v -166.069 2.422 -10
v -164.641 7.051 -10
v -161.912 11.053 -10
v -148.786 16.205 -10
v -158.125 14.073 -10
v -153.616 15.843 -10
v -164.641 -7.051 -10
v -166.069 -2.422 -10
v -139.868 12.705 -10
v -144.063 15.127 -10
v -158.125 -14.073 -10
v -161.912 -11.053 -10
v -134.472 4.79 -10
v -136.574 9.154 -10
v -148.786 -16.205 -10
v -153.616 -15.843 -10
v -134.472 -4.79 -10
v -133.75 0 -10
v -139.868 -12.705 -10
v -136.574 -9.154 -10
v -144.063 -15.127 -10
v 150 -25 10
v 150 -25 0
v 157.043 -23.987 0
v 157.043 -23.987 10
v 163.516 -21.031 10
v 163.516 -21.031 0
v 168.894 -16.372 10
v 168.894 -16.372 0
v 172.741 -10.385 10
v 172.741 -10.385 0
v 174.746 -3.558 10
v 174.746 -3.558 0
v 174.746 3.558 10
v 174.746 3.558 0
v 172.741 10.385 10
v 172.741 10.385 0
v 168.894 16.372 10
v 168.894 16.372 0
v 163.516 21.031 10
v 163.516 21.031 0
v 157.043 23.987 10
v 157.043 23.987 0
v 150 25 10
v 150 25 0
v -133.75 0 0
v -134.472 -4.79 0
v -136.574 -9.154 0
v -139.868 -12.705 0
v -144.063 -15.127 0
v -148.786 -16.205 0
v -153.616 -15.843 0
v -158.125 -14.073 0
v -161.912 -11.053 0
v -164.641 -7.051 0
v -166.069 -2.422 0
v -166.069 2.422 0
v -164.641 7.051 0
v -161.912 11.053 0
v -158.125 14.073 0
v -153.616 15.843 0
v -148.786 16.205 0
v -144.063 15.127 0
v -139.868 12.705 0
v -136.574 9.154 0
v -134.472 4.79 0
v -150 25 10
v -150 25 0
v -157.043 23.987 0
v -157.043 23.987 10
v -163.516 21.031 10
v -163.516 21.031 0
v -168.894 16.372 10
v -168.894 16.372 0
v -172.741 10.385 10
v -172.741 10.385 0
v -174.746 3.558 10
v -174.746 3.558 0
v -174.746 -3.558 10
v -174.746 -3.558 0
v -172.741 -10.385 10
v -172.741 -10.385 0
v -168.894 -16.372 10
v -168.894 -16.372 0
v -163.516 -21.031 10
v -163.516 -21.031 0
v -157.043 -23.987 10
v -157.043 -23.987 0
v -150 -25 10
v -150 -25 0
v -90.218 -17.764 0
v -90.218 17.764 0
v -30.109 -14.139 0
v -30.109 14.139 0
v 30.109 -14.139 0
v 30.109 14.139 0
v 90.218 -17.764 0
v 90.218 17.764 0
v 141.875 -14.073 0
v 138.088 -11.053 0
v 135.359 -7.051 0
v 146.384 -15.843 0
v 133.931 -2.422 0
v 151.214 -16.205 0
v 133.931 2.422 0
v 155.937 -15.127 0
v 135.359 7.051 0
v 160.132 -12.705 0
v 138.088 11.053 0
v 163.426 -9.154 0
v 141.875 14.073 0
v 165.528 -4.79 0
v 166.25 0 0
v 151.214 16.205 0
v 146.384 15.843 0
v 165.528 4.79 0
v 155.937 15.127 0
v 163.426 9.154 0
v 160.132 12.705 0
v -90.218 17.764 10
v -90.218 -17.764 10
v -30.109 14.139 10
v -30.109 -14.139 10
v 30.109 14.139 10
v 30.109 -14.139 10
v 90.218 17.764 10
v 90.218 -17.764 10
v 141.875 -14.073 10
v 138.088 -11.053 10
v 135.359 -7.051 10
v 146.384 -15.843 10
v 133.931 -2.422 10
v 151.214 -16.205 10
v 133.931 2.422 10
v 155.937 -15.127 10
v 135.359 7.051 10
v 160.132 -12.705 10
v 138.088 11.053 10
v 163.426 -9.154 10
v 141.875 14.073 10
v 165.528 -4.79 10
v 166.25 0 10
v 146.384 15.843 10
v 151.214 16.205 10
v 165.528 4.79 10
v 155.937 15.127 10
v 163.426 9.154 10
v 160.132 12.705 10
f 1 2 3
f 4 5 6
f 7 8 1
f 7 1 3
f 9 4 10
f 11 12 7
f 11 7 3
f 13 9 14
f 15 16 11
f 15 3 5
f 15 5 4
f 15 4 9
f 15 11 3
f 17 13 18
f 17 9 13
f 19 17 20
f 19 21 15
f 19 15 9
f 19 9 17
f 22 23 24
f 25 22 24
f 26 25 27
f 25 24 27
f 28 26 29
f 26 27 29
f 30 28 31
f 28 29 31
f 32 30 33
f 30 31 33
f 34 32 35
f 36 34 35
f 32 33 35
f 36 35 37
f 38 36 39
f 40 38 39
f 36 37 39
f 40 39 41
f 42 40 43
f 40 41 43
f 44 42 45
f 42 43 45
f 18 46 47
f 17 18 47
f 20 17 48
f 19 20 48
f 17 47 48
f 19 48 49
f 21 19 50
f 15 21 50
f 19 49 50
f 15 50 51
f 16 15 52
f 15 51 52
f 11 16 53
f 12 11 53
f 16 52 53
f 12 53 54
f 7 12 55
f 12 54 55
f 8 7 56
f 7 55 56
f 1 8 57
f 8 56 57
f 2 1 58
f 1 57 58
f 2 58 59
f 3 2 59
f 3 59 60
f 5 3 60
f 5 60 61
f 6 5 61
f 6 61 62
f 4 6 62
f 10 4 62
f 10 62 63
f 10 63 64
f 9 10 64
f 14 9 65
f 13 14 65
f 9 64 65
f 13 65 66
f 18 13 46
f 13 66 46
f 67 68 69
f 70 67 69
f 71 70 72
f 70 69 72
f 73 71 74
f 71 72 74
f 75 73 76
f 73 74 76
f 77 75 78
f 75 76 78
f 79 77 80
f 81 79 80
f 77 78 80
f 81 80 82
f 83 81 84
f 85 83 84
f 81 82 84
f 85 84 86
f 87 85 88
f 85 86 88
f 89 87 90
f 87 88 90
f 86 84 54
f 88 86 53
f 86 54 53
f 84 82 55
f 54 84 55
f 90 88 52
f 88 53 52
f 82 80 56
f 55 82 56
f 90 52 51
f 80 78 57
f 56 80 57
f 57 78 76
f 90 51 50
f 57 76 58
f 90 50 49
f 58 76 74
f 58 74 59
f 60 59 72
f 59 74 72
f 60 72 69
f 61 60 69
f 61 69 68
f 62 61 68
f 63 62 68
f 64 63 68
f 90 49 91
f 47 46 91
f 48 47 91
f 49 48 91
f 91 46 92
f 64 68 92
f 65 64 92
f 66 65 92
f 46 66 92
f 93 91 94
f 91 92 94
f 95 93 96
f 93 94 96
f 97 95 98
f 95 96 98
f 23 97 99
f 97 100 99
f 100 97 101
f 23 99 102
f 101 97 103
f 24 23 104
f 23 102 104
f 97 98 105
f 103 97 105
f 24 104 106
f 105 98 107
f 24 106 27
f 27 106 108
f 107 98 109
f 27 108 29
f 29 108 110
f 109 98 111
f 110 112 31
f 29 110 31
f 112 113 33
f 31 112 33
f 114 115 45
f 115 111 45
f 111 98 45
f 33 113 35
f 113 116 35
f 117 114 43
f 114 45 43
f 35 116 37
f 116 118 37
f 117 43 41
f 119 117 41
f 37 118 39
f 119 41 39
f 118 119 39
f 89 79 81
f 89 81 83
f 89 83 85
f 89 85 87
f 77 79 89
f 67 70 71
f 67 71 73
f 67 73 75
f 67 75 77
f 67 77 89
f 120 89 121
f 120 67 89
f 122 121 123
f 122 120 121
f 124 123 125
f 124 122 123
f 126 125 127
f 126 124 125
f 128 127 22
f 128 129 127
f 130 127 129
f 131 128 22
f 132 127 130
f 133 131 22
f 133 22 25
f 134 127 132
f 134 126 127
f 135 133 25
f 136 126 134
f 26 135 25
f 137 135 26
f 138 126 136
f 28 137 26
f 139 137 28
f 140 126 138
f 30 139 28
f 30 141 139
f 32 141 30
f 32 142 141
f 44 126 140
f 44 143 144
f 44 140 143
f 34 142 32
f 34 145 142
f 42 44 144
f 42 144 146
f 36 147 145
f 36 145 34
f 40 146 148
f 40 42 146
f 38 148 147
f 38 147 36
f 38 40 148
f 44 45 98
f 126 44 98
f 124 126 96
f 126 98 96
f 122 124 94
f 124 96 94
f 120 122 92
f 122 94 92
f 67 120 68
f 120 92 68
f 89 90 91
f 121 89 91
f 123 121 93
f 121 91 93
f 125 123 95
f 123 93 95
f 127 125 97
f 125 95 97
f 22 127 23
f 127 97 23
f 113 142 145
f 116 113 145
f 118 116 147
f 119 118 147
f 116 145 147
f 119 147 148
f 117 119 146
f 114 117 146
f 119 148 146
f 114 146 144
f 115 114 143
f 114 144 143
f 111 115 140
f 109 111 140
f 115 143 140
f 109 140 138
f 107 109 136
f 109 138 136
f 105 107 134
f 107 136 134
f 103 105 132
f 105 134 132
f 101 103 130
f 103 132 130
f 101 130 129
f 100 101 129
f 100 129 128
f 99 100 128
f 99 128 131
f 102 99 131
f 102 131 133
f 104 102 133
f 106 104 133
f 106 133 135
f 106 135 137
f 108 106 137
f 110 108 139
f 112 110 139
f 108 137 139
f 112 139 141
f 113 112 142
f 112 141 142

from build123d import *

# Parameters (mm, degrees)
BOSS_EXTRUDE1_DEPTH = 10
SKETCH2_R           = 16.25
BOSS_EXTRUDE2_DEPTH = 10
SKETCH3_R           = 16.25
CUT_EXTRUDE4_DEPTH  = 10


with BuildPart() as part:
    # Sketch1 → Boss-Extrude1 (new body)
    with BuildSketch(Plane.XY):
        with BuildLine():
            ThreePointArc((-150, 25), (-175, 0), (-150, -25))
            ThreePointArc((-150, -25), (0, -13.685996664), (150, -25))
            ThreePointArc((150, -25), (175, 0), (150, 25))
            ThreePointArc((150, 25), (0, 13.685996664), (-150, 25))
        make_face()
    extrude(amount=BOSS_EXTRUDE1_DEPTH)

    # Sketch2 → Boss-Extrude2 (add)
    with BuildSketch(Plane(origin=(0, 0, 0), x_dir=(1, 0, 0), z_dir=(0, 0, -1))):
        with Locations((-150, 0)):
            Circle(SKETCH2_R)
    extrude(amount=BOSS_EXTRUDE2_DEPTH)

    # Sketch3 → Cut-Extrude4 (cut)
    with BuildSketch(Plane.XY.offset(10)):
        with Locations((150, 0)):
            Circle(SKETCH3_R)
    extrude(amount=-CUT_EXTRUDE4_DEPTH, mode=Mode.SUBTRACT)


solid = part.part
